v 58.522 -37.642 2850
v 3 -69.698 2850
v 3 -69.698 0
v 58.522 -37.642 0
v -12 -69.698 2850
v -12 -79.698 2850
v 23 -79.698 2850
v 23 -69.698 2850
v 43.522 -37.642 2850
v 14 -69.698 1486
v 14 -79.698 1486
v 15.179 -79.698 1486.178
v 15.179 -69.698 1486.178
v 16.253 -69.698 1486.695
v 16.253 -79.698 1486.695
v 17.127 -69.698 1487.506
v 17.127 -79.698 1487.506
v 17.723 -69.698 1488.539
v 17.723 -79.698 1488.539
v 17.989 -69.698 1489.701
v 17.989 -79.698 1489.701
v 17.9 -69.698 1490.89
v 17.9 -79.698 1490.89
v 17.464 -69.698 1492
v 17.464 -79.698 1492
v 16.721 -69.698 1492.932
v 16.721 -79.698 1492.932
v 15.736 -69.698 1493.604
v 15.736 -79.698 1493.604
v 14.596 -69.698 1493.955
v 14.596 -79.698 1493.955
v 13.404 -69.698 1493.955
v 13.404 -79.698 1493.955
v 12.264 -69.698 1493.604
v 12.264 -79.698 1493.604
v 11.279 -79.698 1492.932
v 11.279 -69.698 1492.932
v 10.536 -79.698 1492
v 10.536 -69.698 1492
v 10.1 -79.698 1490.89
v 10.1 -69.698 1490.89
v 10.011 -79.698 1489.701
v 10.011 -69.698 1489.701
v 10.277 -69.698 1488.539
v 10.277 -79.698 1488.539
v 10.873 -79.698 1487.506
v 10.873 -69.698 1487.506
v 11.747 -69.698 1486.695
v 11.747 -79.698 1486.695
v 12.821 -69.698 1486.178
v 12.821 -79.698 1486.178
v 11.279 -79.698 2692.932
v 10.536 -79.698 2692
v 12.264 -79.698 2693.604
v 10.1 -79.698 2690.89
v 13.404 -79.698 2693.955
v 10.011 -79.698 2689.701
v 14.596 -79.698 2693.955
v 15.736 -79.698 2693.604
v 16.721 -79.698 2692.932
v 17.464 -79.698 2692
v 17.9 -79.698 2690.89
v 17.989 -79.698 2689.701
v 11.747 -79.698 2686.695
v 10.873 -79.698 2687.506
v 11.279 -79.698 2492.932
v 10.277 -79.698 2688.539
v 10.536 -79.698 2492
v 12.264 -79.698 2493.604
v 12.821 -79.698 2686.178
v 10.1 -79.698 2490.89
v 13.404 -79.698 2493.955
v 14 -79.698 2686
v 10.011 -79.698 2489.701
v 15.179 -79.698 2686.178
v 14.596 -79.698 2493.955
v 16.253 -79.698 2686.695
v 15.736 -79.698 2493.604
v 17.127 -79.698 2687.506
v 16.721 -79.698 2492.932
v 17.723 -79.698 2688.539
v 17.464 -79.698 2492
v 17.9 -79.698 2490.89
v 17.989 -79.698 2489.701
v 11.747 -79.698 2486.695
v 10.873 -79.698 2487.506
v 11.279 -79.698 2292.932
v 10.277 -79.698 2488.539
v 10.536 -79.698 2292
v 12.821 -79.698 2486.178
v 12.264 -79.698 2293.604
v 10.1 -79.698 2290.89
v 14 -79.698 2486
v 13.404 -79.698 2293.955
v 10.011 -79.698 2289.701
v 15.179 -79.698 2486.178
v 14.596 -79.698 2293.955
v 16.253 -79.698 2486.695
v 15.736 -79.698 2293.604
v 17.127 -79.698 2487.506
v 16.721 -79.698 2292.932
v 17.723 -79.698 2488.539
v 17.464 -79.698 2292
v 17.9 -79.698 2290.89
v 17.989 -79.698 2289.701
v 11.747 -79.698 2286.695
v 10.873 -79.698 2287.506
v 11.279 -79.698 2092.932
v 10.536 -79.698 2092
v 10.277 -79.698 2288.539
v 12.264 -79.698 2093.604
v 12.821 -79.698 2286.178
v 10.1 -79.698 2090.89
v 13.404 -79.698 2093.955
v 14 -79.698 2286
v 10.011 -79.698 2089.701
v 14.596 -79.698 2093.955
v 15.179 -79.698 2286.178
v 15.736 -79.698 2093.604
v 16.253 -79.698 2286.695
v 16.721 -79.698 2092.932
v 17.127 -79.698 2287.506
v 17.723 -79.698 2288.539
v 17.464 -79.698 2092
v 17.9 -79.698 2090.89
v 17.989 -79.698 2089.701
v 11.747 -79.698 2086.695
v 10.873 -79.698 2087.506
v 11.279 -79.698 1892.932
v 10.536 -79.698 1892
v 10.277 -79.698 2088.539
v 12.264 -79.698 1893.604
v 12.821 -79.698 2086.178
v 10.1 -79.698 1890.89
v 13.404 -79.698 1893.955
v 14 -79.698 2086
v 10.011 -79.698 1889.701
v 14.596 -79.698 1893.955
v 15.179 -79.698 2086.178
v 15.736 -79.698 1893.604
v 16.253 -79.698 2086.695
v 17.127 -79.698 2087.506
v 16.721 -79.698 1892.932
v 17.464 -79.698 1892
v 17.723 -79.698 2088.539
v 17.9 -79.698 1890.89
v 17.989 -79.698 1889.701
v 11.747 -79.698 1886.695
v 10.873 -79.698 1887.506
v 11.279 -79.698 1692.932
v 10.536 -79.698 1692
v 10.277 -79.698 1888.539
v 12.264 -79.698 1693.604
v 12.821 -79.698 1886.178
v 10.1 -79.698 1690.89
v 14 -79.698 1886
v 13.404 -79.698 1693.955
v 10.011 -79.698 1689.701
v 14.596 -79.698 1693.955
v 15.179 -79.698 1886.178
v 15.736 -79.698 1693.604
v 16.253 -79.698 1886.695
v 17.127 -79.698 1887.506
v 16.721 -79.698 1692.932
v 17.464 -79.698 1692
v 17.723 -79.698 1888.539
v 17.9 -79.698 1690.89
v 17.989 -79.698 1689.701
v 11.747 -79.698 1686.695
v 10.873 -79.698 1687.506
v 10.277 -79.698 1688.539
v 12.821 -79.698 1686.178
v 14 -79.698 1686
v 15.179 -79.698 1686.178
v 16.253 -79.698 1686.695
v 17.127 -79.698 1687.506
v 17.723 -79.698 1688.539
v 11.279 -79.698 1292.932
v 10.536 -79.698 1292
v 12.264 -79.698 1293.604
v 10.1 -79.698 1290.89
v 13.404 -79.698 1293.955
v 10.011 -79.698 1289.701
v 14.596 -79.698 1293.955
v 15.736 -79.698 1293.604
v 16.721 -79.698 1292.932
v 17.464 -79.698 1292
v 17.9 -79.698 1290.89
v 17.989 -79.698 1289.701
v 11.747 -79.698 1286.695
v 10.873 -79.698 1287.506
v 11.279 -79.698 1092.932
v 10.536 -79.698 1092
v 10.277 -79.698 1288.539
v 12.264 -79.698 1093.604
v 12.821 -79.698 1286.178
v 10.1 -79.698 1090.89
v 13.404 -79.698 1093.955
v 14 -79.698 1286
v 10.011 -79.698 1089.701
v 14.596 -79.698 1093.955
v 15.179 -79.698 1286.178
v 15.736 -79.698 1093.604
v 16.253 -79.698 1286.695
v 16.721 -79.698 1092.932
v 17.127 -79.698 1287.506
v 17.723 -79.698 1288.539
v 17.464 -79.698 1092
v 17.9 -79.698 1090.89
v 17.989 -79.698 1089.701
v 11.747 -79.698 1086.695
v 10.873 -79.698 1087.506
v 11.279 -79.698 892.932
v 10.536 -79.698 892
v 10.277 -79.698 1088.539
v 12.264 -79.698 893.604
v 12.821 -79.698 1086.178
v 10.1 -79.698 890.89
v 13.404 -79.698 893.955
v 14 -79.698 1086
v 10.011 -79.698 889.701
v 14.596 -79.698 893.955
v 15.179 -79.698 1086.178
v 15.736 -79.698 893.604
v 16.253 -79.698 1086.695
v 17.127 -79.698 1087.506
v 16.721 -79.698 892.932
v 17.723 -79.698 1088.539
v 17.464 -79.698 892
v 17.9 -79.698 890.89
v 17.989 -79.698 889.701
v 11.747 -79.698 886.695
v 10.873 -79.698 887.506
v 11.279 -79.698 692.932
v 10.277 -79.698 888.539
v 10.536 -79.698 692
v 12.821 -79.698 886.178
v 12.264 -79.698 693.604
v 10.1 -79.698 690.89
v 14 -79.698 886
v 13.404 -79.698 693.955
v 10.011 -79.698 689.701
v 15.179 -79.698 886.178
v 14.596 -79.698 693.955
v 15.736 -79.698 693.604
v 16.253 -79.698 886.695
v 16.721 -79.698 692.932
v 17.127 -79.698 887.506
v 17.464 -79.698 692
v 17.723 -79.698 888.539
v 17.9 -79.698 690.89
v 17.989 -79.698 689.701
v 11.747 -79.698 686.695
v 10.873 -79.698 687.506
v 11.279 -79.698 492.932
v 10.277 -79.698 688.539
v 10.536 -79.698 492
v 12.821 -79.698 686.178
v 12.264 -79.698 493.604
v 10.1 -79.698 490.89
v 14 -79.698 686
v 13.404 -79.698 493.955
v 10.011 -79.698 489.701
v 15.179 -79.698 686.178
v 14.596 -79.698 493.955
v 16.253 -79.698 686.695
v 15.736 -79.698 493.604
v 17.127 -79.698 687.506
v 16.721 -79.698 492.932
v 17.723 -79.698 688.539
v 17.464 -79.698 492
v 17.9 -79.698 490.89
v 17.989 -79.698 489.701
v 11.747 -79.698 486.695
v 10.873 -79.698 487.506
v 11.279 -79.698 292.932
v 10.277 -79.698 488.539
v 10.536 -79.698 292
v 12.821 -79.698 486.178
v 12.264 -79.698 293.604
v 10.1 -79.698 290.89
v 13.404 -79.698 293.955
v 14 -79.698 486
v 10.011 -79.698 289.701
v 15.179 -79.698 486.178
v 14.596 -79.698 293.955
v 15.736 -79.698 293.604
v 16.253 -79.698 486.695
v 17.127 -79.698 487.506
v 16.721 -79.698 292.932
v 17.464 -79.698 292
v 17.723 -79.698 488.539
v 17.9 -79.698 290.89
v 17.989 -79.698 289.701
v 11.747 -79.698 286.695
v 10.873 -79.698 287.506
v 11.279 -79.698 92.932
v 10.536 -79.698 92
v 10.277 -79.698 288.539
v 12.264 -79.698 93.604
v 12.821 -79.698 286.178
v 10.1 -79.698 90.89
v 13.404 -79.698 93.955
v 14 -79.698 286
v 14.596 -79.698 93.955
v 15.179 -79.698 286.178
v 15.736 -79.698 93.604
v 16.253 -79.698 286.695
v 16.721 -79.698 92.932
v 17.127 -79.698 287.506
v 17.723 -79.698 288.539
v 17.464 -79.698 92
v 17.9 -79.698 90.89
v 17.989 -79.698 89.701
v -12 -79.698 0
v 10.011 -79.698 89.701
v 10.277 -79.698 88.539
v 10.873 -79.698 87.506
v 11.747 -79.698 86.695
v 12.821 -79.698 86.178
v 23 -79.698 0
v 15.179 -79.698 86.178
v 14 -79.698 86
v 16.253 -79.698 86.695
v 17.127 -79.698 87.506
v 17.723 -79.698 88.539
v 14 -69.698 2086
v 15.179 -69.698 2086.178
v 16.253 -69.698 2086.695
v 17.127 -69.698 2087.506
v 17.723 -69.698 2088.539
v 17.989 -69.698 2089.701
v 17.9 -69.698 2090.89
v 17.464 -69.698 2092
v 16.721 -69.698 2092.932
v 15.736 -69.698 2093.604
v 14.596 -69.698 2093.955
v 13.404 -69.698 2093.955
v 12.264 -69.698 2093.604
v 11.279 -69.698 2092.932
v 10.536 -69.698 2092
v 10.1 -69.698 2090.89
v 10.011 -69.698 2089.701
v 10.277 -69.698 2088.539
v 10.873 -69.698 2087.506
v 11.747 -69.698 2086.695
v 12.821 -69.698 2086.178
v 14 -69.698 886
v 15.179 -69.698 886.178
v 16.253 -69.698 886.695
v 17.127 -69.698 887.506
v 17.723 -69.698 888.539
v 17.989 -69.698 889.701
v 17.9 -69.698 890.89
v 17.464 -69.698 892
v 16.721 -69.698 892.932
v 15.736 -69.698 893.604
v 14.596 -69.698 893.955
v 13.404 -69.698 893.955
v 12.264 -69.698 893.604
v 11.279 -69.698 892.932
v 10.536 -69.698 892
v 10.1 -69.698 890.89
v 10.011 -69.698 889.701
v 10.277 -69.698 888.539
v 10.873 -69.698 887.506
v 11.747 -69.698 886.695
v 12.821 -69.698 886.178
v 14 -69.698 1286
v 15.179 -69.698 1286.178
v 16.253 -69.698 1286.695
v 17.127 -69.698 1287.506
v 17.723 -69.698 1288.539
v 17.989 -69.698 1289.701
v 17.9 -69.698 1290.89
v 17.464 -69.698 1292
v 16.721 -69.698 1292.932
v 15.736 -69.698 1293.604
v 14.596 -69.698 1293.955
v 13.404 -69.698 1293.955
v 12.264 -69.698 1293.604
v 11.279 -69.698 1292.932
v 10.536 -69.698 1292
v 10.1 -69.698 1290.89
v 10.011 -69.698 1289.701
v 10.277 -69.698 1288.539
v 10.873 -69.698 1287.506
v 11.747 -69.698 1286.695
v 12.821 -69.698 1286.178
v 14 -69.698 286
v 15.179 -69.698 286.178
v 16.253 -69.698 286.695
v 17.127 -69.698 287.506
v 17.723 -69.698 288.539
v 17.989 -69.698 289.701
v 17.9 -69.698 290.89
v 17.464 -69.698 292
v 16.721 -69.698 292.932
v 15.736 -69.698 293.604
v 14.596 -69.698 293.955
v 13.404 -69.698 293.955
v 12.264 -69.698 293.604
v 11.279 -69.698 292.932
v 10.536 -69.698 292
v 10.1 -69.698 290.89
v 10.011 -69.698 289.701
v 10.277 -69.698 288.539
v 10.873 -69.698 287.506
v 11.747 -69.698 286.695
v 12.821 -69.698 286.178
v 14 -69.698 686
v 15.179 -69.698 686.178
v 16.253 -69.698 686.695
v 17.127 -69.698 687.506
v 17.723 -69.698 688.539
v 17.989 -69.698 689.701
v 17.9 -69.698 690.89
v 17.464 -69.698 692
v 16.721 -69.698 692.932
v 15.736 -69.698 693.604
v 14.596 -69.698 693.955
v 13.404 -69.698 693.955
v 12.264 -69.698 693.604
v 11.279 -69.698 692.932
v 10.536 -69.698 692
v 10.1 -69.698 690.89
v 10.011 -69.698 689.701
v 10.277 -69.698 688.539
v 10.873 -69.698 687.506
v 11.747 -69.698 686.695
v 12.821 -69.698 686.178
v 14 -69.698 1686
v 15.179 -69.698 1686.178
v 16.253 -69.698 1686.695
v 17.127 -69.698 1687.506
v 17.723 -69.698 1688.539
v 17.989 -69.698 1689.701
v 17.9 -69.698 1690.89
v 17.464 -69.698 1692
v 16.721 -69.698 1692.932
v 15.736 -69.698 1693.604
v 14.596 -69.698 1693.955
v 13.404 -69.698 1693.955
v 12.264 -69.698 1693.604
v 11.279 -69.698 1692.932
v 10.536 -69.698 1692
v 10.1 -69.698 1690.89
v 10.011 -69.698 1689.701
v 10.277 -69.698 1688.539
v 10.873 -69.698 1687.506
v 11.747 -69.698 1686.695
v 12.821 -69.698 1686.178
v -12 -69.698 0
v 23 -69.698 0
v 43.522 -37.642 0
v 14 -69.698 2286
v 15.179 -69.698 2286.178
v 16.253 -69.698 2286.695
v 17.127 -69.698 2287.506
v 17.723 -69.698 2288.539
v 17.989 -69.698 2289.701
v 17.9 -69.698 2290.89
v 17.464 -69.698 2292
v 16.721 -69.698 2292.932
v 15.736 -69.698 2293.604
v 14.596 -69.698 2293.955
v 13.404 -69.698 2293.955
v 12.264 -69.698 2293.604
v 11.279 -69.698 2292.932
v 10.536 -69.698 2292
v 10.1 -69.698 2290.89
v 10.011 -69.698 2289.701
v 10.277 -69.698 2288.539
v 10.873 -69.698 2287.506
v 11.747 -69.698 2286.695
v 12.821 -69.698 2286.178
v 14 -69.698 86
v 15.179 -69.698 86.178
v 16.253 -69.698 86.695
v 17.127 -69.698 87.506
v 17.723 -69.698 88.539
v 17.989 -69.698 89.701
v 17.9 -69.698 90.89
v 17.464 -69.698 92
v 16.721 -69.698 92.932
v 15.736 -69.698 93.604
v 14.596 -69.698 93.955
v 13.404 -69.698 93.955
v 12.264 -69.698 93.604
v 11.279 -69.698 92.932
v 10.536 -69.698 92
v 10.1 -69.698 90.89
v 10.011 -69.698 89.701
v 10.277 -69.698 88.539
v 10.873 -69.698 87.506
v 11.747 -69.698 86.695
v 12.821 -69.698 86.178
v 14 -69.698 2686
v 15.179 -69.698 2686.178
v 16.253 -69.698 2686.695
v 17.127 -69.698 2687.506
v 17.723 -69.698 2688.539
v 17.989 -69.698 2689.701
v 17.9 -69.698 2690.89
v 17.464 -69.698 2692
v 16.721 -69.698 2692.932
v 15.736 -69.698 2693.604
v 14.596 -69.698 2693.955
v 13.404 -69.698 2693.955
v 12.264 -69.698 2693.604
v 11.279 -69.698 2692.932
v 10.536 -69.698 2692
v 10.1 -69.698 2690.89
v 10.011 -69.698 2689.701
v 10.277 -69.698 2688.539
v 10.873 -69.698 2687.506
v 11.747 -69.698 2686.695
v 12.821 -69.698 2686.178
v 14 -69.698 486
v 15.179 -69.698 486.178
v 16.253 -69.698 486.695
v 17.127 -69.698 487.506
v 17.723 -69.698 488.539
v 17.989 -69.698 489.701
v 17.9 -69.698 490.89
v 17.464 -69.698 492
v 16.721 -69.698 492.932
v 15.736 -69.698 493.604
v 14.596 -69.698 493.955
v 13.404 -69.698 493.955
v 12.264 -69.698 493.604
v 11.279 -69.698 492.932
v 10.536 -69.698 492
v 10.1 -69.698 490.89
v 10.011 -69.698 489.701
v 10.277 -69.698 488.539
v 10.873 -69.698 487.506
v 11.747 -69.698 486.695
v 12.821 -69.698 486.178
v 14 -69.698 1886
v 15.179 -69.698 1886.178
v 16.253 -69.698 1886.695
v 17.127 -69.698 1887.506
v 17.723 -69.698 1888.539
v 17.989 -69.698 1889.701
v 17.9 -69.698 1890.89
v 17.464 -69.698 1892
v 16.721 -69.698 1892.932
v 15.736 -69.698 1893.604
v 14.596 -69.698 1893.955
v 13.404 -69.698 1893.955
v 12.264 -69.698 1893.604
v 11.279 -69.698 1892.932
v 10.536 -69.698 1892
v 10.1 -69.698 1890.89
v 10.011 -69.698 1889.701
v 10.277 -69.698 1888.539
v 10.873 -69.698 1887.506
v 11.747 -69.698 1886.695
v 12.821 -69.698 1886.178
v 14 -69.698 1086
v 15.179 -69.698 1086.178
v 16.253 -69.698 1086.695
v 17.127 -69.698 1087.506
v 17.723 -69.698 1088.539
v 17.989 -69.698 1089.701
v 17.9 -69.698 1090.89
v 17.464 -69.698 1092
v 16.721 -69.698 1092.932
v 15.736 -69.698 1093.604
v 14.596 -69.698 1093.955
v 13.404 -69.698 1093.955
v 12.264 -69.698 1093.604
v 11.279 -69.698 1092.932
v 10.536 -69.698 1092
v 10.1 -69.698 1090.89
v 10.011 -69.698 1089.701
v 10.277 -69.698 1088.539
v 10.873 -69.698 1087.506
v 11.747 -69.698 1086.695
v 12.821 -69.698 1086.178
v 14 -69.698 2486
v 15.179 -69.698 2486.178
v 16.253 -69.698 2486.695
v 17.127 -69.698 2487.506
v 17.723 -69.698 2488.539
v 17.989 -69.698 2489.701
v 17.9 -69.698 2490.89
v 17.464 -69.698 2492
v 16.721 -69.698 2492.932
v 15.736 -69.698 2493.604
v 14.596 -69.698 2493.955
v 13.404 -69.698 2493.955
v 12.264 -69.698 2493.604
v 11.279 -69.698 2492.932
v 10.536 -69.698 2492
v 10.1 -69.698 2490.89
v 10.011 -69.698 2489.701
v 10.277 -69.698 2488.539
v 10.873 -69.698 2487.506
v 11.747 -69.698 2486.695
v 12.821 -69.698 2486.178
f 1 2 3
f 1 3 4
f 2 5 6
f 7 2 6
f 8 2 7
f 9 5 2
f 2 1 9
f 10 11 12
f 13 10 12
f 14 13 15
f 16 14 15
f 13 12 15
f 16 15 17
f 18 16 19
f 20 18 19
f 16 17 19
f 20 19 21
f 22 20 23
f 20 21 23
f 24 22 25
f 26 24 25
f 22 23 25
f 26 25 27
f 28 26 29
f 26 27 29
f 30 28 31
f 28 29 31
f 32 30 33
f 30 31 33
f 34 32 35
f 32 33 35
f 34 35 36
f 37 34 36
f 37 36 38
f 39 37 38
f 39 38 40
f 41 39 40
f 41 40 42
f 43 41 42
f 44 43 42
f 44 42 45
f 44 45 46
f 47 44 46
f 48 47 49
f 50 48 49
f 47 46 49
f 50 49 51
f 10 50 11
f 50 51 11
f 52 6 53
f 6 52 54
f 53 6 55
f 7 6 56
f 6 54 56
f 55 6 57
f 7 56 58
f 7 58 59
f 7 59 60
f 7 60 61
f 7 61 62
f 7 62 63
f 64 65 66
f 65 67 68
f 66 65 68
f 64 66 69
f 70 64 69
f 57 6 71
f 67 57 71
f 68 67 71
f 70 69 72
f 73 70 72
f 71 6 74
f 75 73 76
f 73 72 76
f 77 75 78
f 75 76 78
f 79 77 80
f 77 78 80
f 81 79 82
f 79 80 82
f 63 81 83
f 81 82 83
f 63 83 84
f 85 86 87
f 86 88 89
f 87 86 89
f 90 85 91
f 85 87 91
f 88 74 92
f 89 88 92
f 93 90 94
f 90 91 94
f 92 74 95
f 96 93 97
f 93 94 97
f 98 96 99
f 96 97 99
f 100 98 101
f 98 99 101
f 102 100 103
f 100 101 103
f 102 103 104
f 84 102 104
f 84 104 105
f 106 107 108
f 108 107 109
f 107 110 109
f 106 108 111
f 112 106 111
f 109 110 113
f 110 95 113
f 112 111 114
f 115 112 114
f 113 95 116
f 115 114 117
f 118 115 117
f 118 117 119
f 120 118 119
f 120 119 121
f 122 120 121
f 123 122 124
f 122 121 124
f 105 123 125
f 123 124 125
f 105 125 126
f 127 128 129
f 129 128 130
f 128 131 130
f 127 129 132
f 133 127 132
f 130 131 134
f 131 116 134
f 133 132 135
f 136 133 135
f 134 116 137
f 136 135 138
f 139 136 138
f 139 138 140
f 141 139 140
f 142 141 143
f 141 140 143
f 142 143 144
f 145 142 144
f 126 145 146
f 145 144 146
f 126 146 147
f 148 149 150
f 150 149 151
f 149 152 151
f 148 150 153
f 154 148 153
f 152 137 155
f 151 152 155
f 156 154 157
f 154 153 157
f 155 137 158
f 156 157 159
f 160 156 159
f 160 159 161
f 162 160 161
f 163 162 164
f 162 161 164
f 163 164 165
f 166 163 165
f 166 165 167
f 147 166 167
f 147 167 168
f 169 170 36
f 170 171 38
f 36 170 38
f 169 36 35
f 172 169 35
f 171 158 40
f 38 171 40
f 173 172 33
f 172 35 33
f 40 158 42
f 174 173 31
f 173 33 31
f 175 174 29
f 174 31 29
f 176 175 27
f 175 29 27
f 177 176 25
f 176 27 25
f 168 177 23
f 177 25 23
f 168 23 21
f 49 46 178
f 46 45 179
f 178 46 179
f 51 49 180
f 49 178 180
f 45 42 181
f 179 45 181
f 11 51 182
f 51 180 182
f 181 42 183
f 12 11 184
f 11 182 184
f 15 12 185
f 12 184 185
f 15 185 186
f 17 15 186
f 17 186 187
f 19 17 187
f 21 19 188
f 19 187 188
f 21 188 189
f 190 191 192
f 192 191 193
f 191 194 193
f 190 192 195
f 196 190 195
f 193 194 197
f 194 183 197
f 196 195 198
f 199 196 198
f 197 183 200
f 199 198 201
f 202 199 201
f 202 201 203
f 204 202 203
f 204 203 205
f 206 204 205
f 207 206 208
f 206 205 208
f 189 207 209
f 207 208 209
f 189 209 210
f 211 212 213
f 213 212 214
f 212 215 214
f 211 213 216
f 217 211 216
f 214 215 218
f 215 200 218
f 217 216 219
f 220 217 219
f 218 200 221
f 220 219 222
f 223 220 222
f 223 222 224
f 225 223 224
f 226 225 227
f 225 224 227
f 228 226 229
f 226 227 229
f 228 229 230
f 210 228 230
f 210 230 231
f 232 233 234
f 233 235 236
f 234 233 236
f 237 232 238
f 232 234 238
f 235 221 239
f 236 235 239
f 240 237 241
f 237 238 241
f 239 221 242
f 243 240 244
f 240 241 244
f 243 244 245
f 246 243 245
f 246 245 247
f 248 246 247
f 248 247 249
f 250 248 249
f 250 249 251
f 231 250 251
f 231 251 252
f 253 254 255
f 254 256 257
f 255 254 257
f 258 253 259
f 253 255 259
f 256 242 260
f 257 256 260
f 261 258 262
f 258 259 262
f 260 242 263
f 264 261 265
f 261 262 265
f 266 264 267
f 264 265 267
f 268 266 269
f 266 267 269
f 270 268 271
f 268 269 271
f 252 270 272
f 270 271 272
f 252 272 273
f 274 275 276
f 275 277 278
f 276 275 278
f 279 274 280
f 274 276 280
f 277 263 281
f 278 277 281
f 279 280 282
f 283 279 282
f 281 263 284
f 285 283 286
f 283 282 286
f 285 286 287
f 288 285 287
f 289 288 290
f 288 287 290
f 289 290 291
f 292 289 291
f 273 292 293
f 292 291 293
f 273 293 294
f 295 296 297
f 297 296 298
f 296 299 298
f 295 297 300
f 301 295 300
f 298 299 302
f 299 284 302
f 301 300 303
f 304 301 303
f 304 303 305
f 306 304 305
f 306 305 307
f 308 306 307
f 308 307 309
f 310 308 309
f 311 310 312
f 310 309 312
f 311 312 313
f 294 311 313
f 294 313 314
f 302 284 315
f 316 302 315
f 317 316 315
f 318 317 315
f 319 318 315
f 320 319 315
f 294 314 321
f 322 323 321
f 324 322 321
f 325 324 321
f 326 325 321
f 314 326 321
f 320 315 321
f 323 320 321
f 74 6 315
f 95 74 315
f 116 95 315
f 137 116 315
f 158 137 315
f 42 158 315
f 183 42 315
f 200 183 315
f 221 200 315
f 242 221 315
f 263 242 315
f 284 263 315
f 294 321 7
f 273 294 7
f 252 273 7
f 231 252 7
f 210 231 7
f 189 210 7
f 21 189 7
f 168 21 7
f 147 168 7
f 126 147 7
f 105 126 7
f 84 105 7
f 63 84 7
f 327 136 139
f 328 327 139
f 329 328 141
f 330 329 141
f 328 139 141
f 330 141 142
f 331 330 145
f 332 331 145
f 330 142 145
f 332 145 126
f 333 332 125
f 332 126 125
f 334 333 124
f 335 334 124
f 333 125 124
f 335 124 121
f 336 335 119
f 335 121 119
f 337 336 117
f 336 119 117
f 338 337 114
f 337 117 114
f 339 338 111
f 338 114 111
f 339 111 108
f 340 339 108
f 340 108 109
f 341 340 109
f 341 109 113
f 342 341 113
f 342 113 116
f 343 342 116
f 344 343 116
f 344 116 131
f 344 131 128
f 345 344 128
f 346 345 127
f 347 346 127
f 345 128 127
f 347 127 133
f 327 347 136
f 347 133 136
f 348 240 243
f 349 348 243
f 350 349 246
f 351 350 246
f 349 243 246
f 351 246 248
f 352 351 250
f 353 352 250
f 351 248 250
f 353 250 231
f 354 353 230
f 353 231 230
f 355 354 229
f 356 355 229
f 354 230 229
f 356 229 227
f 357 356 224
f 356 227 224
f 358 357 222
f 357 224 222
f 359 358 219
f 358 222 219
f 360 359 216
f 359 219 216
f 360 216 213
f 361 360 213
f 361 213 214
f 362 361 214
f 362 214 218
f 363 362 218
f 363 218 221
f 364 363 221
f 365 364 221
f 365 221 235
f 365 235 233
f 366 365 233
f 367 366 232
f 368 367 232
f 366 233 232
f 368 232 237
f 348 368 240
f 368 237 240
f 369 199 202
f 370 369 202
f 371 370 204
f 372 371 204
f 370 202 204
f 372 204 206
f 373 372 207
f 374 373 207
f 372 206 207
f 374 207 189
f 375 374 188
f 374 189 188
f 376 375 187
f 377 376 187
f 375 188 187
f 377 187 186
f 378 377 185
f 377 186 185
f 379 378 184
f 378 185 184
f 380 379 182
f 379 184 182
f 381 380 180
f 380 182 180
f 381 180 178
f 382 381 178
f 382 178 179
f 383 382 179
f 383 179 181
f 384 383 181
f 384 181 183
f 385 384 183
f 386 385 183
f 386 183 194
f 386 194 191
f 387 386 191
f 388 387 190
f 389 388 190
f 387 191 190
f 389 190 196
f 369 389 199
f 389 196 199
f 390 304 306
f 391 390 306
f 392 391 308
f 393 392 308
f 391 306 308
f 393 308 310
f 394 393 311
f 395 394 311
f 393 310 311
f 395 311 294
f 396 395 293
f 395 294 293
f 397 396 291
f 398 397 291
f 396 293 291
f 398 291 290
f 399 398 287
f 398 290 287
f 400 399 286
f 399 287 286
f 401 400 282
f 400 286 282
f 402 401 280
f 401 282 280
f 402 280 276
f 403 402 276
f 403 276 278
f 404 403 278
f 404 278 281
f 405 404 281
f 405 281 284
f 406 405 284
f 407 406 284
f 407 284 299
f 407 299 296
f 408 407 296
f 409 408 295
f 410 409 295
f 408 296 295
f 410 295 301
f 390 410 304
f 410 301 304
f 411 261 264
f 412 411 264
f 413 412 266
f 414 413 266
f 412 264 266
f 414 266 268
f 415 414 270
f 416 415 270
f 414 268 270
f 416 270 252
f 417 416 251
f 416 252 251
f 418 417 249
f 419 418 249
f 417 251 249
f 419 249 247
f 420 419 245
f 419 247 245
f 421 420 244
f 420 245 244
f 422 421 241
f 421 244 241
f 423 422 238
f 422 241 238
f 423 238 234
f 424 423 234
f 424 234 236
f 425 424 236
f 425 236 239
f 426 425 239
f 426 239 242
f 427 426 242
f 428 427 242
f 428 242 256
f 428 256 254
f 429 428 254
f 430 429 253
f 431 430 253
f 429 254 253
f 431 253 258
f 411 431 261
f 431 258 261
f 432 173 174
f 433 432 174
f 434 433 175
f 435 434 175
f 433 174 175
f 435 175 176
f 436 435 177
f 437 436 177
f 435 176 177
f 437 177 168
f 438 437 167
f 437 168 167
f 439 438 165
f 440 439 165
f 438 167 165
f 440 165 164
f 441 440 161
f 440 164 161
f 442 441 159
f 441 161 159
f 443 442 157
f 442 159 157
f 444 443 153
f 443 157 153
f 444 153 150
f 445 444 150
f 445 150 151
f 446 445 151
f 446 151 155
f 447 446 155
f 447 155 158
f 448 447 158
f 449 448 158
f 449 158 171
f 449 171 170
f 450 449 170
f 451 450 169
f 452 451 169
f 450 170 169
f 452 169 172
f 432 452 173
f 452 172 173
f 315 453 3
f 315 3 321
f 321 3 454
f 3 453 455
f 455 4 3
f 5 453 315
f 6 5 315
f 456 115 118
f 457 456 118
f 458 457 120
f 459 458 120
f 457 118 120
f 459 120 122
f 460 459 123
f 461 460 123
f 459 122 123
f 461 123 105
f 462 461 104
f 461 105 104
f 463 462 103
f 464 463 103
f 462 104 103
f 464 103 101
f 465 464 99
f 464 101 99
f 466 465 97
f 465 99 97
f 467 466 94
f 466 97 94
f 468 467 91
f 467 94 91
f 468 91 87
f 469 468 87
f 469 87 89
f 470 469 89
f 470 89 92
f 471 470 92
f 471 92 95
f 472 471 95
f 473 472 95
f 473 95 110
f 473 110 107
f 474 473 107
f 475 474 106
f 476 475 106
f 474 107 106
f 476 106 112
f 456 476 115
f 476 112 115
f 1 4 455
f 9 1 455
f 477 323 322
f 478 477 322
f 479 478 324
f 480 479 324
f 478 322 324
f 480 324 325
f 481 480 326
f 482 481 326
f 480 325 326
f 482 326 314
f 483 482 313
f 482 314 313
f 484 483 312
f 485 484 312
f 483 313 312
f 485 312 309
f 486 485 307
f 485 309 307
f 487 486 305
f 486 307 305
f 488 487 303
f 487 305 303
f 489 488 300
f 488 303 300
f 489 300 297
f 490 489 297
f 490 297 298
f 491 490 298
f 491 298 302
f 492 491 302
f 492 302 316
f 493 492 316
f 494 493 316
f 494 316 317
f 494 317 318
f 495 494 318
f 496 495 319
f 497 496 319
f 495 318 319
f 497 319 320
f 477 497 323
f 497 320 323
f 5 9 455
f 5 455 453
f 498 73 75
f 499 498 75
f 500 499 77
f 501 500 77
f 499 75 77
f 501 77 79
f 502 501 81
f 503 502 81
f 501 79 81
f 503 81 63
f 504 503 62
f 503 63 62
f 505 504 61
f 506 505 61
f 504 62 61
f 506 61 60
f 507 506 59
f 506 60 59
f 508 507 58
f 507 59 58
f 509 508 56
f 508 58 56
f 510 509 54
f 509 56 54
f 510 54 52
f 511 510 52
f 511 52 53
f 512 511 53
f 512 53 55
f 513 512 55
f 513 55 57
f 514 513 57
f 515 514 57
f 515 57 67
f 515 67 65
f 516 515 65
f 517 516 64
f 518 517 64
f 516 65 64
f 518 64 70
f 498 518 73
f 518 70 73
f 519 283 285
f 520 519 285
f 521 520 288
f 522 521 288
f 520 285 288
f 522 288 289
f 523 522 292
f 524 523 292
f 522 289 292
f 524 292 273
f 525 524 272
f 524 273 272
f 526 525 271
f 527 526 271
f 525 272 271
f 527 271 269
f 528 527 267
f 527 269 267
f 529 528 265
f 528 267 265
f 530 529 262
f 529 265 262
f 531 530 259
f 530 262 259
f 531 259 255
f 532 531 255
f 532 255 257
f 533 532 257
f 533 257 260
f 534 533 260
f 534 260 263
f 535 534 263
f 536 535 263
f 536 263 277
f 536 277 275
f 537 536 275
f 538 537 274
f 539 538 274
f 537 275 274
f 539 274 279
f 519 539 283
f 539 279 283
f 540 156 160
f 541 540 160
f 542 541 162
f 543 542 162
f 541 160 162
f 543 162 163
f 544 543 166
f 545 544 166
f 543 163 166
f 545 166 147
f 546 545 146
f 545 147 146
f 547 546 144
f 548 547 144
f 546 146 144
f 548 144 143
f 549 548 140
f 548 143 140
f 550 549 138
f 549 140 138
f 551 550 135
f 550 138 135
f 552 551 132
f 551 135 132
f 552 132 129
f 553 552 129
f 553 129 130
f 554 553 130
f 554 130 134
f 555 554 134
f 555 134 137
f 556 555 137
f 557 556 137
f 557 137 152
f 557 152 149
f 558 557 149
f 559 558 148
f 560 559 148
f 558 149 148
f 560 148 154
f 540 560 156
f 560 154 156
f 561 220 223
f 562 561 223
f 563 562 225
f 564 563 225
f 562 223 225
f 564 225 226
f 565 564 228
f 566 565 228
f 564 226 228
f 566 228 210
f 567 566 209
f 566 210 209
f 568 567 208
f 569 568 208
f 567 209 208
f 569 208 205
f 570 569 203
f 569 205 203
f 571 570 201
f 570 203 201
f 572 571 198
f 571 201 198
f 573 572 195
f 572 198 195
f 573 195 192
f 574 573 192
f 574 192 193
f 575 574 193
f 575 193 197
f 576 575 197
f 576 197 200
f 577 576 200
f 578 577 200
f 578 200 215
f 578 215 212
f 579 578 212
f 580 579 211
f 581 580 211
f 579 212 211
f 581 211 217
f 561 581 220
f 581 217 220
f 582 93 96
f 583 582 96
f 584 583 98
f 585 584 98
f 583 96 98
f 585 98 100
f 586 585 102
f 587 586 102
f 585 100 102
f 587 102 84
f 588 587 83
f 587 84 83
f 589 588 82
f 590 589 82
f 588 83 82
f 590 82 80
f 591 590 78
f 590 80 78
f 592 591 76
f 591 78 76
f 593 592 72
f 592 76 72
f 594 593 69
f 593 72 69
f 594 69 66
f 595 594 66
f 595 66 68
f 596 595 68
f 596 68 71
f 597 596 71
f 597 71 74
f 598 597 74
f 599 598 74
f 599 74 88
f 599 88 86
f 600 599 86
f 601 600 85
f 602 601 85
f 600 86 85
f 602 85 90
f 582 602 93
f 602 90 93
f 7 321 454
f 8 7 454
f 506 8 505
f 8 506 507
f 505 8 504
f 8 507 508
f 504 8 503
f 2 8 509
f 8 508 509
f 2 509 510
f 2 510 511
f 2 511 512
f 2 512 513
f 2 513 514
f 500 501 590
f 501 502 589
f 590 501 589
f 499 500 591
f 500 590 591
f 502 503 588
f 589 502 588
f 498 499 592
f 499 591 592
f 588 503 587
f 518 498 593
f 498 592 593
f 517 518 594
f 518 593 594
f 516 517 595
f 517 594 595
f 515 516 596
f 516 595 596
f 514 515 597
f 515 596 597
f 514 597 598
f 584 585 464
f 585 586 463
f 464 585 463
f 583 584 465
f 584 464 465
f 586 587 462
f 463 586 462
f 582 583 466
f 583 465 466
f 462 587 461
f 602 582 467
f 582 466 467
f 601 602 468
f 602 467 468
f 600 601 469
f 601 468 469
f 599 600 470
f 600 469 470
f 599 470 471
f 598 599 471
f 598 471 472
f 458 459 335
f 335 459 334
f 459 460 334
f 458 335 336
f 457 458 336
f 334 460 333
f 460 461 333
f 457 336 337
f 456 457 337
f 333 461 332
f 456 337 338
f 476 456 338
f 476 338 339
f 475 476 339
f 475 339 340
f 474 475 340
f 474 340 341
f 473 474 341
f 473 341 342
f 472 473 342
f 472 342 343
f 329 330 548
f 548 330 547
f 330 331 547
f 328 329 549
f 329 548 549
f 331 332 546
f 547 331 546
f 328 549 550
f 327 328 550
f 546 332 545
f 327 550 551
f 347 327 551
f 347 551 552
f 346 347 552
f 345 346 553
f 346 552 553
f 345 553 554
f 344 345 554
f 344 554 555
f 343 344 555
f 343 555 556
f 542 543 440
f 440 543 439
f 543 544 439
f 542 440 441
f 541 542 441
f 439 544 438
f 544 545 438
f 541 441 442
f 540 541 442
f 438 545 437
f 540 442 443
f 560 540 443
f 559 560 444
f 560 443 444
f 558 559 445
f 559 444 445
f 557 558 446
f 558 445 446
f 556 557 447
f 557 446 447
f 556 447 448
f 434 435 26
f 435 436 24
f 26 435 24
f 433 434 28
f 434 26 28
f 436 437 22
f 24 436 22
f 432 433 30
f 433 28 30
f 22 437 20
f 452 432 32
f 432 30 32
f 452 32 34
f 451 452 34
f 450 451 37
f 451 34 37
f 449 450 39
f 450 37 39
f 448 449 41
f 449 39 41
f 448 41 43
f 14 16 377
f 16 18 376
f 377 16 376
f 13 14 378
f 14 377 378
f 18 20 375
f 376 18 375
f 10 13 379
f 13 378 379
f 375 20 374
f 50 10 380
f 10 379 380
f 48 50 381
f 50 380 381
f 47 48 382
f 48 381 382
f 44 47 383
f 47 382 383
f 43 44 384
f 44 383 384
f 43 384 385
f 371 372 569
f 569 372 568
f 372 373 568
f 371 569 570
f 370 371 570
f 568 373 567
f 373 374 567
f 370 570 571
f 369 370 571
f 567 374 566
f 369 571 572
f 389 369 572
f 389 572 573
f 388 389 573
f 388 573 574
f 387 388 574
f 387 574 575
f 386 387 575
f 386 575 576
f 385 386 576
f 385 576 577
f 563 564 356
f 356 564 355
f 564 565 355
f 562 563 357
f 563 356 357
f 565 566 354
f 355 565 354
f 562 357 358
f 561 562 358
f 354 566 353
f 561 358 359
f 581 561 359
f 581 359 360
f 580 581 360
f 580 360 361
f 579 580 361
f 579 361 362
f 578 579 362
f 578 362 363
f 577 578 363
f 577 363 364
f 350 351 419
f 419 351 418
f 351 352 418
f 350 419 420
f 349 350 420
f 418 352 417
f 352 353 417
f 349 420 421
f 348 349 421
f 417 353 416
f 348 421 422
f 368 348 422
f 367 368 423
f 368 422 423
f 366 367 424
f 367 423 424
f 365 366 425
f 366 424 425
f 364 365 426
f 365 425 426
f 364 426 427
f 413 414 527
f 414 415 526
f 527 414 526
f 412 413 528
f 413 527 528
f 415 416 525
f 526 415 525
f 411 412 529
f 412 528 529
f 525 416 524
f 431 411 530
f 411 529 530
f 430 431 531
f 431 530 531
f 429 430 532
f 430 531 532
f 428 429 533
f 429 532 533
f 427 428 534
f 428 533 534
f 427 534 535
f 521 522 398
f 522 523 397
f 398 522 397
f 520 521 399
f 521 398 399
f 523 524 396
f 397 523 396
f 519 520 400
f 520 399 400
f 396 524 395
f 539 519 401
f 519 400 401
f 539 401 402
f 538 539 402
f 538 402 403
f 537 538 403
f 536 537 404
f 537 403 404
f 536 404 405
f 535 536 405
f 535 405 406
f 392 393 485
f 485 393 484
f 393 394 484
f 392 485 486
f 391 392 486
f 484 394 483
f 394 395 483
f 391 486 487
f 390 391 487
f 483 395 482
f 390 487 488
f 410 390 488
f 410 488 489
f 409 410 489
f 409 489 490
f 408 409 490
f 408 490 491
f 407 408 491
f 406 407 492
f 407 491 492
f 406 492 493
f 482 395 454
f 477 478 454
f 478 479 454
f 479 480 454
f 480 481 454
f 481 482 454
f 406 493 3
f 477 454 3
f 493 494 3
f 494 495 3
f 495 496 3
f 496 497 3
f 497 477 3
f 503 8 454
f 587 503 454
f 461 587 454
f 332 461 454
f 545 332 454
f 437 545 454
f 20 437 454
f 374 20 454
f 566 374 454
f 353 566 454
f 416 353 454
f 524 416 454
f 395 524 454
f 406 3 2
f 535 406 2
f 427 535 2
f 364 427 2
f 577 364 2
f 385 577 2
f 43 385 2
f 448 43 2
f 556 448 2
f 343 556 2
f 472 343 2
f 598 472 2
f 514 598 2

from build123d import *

# Parameters (mm, degrees)
BOSS_EXTRU_1_DEPTH      = 2850
ESQUISSE3_R             = 4
ENL_V_MAT_EXTRU_1_DEPTH = 10


with BuildPart() as part:
    # Esquisse1 → Boss.-Extru.1 (new body)
    with BuildSketch(Plane.XY):
        Polygon((-12, -79.697824129), (23, -79.697824129), (23, -69.697824129), (3, -69.697824129), (58.522190754, -37.642072351), (43.522190754, -37.642072351), (-12, -69.697824129), align=None)
    extrude(amount=BOSS_EXTRU_1_DEPTH)

    # Esquisse3 → Enlèv. mat.-Extru.1 (cut)
    with BuildSketch(Plane.XZ.offset(79.697824129)):
        with Locations(Location((14, 90, 0), (0, 0, 270))):
            Circle(ESQUISSE3_R)
        with Locations(Location((14, 290, 0), (0, 0, 270))):
            Circle(ESQUISSE3_R)
        with Locations(Location((14, 490, 0), (0, 0, 270))):
            Circle(ESQUISSE3_R)
        with Locations(Location((14, 690, 0), (0, 0, 270))):
            Circle(ESQUISSE3_R)
        with Locations(Location((14, 890, 0), (0, 0, 270))):
            Circle(ESQUISSE3_R)
        with Locations(Location((14, 1090, 0), (0, 0, 270))):
            Circle(ESQUISSE3_R)
        with Locations(Location((14, 1290, 0), (0, 0, 270))):
            Circle(ESQUISSE3_R)
        with Locations(Location((14, 1490, 0), (0, 0, 270))):
            Circle(ESQUISSE3_R)
        with Locations(Location((14, 1690, 0), (0, 0, 270))):
            Circle(ESQUISSE3_R)
        with Locations(Location((14, 1890, 0), (0, 0, 270))):
            Circle(ESQUISSE3_R)
        with Locations(Location((14, 2090, 0), (0, 0, 270))):
            Circle(ESQUISSE3_R)
        with Locations(Location((14, 2290, 0), (0, 0, 270))):
            Circle(ESQUISSE3_R)
        with Locations(Location((14, 2490, 0), (0, 0, 270))):
            Circle(ESQUISSE3_R)
        with Locations(Location((14, 2690, 0), (0, 0, 270))):
            Circle(ESQUISSE3_R)
    extrude(amount=-ENL_V_MAT_EXTRU_1_DEPTH, mode=Mode.SUBTRACT)


solid = part.part
